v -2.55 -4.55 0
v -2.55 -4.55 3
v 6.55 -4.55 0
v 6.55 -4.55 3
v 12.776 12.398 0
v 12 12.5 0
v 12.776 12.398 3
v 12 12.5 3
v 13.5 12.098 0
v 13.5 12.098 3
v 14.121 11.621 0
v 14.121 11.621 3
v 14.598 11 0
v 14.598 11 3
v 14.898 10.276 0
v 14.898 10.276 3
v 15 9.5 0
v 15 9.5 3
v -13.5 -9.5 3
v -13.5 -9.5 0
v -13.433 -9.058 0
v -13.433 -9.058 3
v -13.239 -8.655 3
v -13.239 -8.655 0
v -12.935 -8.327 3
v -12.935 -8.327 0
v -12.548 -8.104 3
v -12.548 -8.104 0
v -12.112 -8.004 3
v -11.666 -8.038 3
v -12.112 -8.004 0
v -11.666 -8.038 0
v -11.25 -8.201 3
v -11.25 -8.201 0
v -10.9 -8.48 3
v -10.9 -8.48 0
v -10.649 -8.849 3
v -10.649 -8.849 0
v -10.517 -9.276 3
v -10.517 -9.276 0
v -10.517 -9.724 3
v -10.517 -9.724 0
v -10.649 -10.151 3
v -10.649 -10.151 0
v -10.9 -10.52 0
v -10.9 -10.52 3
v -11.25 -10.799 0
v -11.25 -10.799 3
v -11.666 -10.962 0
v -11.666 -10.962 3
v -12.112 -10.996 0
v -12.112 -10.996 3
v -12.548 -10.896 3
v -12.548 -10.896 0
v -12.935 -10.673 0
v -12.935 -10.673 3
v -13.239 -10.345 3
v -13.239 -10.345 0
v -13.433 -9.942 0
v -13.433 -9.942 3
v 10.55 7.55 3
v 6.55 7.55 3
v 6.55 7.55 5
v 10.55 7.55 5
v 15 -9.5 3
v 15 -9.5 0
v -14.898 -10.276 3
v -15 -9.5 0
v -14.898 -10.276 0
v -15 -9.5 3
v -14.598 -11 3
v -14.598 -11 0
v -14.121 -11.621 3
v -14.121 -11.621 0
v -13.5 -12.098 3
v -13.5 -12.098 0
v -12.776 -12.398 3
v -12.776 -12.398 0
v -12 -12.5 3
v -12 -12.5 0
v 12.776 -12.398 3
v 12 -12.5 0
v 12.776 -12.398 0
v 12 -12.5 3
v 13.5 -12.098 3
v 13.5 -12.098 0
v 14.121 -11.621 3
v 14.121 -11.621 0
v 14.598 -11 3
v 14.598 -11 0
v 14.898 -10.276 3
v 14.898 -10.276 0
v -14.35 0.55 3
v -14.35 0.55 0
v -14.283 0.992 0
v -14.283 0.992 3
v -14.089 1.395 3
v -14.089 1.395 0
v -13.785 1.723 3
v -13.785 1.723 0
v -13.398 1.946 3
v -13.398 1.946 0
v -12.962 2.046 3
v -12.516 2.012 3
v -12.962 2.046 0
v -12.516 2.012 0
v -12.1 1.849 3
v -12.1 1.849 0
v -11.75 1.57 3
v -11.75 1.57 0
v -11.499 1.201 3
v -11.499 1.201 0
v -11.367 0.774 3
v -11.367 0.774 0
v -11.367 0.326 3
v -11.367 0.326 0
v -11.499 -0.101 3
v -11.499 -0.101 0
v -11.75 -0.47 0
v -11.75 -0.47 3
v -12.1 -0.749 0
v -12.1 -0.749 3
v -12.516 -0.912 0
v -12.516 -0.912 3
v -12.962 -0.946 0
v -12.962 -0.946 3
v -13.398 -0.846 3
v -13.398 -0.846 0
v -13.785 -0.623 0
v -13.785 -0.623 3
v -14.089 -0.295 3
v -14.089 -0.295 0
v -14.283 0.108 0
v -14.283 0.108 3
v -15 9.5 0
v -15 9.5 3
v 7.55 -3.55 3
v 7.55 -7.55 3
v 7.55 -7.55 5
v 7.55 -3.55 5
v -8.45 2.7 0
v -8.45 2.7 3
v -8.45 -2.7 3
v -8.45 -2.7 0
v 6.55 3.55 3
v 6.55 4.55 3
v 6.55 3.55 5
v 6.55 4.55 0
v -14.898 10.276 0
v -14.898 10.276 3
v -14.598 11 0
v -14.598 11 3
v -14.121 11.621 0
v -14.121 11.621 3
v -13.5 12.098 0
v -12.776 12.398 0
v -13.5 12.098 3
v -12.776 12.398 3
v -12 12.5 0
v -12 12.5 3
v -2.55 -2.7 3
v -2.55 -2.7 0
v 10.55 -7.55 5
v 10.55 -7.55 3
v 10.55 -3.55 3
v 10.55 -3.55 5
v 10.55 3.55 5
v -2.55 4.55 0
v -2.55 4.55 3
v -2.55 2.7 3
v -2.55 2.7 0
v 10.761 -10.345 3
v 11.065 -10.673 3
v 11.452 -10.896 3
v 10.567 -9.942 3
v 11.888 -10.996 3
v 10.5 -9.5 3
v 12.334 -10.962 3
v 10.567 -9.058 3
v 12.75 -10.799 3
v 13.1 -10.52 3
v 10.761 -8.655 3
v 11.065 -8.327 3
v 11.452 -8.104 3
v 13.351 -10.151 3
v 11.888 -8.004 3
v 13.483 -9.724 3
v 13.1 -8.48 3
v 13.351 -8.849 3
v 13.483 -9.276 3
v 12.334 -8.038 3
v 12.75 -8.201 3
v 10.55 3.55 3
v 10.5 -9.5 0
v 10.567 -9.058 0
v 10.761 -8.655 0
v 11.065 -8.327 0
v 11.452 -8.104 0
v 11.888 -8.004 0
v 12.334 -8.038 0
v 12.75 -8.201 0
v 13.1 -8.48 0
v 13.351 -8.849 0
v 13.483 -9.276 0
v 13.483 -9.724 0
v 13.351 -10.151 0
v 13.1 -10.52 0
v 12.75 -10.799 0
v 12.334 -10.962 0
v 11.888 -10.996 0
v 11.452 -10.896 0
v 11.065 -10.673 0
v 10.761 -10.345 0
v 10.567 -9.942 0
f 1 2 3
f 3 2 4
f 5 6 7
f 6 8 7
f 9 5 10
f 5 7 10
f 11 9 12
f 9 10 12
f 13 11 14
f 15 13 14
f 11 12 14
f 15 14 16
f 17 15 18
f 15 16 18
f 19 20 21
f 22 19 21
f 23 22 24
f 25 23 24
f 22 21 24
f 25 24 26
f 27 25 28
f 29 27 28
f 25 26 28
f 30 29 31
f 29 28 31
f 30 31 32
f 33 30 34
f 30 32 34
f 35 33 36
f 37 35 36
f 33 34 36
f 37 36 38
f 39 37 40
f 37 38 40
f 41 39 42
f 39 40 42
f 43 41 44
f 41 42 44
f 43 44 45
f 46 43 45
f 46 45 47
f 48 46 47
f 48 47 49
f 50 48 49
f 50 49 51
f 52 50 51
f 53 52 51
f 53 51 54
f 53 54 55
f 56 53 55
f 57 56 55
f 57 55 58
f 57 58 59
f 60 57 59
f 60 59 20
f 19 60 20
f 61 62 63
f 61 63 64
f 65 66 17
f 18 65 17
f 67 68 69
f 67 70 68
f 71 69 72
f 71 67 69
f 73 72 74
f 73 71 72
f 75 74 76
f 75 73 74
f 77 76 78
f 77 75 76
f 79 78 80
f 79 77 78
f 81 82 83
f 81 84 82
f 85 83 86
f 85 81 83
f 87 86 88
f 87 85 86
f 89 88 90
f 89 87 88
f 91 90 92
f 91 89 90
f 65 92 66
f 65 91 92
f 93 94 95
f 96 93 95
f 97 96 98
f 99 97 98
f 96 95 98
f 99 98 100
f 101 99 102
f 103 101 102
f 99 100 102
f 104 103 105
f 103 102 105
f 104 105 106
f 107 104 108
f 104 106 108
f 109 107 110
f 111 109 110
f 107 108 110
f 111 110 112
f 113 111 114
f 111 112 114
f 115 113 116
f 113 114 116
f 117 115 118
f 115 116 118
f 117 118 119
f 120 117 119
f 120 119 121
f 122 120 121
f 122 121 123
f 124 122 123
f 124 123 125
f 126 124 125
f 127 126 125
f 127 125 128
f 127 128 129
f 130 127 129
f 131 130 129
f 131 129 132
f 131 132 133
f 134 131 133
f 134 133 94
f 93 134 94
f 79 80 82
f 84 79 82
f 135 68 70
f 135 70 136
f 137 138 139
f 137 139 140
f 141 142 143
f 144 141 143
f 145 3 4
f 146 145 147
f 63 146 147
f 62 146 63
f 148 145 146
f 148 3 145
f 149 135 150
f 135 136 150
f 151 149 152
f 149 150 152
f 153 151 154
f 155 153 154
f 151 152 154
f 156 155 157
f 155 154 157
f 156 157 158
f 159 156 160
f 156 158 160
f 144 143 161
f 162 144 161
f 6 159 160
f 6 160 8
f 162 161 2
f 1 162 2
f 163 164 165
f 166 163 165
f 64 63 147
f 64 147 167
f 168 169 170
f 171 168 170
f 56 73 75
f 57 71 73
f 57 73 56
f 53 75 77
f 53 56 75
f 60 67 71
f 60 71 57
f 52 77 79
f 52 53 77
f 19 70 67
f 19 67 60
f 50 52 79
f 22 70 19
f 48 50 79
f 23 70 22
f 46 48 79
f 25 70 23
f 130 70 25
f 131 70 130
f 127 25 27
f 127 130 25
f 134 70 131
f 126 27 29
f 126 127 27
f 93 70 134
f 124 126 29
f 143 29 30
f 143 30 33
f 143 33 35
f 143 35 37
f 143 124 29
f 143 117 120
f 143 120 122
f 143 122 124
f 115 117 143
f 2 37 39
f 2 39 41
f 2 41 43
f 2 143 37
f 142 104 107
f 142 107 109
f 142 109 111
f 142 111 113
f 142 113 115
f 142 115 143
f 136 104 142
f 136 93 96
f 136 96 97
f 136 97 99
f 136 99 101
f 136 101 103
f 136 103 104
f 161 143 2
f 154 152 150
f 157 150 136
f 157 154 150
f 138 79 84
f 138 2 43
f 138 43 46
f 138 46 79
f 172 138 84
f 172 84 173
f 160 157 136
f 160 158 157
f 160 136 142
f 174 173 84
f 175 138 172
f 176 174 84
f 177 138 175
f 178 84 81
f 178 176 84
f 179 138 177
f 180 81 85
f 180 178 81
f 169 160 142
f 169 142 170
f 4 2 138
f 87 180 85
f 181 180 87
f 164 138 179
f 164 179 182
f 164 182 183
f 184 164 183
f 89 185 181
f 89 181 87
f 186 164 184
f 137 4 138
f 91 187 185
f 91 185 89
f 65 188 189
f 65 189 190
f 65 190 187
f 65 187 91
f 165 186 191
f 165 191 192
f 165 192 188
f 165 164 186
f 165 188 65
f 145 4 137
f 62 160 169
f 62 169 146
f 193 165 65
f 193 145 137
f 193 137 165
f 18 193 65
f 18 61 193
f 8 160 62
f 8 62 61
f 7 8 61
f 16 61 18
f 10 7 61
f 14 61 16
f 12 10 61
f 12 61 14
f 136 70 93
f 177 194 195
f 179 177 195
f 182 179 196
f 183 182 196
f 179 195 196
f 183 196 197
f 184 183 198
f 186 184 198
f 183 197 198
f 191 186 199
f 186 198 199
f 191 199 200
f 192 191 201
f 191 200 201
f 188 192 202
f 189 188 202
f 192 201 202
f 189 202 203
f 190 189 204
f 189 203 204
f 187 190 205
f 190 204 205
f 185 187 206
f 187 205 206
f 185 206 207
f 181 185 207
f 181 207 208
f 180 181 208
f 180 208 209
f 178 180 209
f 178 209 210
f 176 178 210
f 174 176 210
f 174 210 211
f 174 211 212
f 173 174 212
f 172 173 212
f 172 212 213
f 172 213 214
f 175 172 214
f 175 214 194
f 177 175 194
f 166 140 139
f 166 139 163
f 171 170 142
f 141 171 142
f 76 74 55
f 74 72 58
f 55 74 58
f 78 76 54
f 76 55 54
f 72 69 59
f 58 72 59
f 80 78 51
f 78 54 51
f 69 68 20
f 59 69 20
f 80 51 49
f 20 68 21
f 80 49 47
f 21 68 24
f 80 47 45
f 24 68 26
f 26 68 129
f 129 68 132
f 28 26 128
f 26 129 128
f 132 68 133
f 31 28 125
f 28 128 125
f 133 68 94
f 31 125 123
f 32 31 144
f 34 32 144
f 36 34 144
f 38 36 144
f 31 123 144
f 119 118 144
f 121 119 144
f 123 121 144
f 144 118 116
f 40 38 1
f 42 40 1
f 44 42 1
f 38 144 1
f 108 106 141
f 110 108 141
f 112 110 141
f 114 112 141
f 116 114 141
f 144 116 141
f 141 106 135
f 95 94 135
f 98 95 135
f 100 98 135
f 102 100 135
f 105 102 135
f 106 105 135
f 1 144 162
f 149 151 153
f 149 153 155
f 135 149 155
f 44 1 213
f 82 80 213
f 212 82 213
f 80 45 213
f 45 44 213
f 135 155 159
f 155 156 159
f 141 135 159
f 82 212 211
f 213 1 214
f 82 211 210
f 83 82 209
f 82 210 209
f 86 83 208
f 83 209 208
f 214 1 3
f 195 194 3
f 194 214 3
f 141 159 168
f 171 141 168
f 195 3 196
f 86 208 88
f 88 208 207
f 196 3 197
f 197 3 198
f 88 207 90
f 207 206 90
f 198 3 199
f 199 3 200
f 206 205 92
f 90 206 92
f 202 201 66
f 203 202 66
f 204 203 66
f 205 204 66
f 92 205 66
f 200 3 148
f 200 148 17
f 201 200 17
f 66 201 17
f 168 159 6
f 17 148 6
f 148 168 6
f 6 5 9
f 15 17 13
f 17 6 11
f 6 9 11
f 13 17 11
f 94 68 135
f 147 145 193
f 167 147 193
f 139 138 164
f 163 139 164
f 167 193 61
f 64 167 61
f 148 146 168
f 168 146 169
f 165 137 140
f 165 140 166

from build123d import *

# Parameters (mm, degrees)
SKETCH_1_W          = 30
SKETCH_1_H          = 25
EXTRUDE_1_DEPTH     = 3
CUT_EXTRUDE_1_DEPTH = 20.754746265
SKETCH_3_W          = 4
SKETCH_3_H          = 4
SKETCH_3_W_2        = 3
EXTRUDE_2_DEPTH     = 2
FILLET_1_R          = 3
SKETCH_4_R          = 1.5
CUT_EXTRUDE_2_DEPTH = 21.155644371
SKETCH_5_R          = 1.5
CUT_EXTRUDE_3_DEPTH = 8


with BuildPart() as part:
    # 草图1 → 凸台-拉伸1 (new body)
    with BuildSketch(Plane.XY):
        Rectangle(SKETCH_1_W, SKETCH_1_H)
    extrude(amount=EXTRUDE_1_DEPTH)

    # 草图2 → 切除-拉伸1 (cut, through all)
    with BuildSketch(Plane.XY.offset(3)):
        Polygon((6.55, 0), (6.55, 4.55), (-2.55, 4.55), (-2.55, 2.7), (-8.45, 2.7), (-8.45, 0), (-8.45, -2.7), (-2.55, -2.7), (-2.55, -4.55), (6.55, -4.55), align=None)
    extrude(amount=-CUT_EXTRUDE_1_DEPTH, mode=Mode.SUBTRACT)

    # 草图3 → 凸台-拉伸2 (add)
    with BuildSketch(Plane.XY.offset(3)):
        with Locations((8.55, 5.55)):
            Rectangle(SKETCH_3_W, SKETCH_3_H)
        with Locations((9.05, -5.55)):
            Rectangle(SKETCH_3_W_2, SKETCH_3_H)
    extrude(amount=EXTRUDE_2_DEPTH)

    # 圆角1
    fillet_1_edges = [part.edges().sort_by_distance(p)[0] for p in [
        (-15, 12.5, 1.5),
        (15, 12.5, 1.5),
        (15, -12.5, 1.5),
        (-15, -12.5, 1.5),
    ]]
    fillet(fillet_1_edges, radius=FILLET_1_R)

    # 草图4 → 切除-拉伸2 (cut, through all)
    with BuildSketch(Plane(origin=(0, 0, 0), x_dir=(-1, 0, 0), z_dir=(0, 0, -1))):
        with Locations((12, -9.5)):
            Circle(SKETCH_4_R)
        with Locations((-12, -9.5)):
            Circle(SKETCH_4_R)
    extrude(amount=-CUT_EXTRUDE_2_DEPTH, mode=Mode.SUBTRACT)

    # 草图5 → 切除-拉伸3 (cut)
    with BuildSketch(Plane(origin=(0, 0, 0), x_dir=(-1, 0, 0), z_dir=(0, 0, -1))):
        with Locations((12.85, 0.55)):
            Circle(SKETCH_5_R)
    extrude(amount=-CUT_EXTRUDE_3_DEPTH, mode=Mode.SUBTRACT)


solid = part.part
